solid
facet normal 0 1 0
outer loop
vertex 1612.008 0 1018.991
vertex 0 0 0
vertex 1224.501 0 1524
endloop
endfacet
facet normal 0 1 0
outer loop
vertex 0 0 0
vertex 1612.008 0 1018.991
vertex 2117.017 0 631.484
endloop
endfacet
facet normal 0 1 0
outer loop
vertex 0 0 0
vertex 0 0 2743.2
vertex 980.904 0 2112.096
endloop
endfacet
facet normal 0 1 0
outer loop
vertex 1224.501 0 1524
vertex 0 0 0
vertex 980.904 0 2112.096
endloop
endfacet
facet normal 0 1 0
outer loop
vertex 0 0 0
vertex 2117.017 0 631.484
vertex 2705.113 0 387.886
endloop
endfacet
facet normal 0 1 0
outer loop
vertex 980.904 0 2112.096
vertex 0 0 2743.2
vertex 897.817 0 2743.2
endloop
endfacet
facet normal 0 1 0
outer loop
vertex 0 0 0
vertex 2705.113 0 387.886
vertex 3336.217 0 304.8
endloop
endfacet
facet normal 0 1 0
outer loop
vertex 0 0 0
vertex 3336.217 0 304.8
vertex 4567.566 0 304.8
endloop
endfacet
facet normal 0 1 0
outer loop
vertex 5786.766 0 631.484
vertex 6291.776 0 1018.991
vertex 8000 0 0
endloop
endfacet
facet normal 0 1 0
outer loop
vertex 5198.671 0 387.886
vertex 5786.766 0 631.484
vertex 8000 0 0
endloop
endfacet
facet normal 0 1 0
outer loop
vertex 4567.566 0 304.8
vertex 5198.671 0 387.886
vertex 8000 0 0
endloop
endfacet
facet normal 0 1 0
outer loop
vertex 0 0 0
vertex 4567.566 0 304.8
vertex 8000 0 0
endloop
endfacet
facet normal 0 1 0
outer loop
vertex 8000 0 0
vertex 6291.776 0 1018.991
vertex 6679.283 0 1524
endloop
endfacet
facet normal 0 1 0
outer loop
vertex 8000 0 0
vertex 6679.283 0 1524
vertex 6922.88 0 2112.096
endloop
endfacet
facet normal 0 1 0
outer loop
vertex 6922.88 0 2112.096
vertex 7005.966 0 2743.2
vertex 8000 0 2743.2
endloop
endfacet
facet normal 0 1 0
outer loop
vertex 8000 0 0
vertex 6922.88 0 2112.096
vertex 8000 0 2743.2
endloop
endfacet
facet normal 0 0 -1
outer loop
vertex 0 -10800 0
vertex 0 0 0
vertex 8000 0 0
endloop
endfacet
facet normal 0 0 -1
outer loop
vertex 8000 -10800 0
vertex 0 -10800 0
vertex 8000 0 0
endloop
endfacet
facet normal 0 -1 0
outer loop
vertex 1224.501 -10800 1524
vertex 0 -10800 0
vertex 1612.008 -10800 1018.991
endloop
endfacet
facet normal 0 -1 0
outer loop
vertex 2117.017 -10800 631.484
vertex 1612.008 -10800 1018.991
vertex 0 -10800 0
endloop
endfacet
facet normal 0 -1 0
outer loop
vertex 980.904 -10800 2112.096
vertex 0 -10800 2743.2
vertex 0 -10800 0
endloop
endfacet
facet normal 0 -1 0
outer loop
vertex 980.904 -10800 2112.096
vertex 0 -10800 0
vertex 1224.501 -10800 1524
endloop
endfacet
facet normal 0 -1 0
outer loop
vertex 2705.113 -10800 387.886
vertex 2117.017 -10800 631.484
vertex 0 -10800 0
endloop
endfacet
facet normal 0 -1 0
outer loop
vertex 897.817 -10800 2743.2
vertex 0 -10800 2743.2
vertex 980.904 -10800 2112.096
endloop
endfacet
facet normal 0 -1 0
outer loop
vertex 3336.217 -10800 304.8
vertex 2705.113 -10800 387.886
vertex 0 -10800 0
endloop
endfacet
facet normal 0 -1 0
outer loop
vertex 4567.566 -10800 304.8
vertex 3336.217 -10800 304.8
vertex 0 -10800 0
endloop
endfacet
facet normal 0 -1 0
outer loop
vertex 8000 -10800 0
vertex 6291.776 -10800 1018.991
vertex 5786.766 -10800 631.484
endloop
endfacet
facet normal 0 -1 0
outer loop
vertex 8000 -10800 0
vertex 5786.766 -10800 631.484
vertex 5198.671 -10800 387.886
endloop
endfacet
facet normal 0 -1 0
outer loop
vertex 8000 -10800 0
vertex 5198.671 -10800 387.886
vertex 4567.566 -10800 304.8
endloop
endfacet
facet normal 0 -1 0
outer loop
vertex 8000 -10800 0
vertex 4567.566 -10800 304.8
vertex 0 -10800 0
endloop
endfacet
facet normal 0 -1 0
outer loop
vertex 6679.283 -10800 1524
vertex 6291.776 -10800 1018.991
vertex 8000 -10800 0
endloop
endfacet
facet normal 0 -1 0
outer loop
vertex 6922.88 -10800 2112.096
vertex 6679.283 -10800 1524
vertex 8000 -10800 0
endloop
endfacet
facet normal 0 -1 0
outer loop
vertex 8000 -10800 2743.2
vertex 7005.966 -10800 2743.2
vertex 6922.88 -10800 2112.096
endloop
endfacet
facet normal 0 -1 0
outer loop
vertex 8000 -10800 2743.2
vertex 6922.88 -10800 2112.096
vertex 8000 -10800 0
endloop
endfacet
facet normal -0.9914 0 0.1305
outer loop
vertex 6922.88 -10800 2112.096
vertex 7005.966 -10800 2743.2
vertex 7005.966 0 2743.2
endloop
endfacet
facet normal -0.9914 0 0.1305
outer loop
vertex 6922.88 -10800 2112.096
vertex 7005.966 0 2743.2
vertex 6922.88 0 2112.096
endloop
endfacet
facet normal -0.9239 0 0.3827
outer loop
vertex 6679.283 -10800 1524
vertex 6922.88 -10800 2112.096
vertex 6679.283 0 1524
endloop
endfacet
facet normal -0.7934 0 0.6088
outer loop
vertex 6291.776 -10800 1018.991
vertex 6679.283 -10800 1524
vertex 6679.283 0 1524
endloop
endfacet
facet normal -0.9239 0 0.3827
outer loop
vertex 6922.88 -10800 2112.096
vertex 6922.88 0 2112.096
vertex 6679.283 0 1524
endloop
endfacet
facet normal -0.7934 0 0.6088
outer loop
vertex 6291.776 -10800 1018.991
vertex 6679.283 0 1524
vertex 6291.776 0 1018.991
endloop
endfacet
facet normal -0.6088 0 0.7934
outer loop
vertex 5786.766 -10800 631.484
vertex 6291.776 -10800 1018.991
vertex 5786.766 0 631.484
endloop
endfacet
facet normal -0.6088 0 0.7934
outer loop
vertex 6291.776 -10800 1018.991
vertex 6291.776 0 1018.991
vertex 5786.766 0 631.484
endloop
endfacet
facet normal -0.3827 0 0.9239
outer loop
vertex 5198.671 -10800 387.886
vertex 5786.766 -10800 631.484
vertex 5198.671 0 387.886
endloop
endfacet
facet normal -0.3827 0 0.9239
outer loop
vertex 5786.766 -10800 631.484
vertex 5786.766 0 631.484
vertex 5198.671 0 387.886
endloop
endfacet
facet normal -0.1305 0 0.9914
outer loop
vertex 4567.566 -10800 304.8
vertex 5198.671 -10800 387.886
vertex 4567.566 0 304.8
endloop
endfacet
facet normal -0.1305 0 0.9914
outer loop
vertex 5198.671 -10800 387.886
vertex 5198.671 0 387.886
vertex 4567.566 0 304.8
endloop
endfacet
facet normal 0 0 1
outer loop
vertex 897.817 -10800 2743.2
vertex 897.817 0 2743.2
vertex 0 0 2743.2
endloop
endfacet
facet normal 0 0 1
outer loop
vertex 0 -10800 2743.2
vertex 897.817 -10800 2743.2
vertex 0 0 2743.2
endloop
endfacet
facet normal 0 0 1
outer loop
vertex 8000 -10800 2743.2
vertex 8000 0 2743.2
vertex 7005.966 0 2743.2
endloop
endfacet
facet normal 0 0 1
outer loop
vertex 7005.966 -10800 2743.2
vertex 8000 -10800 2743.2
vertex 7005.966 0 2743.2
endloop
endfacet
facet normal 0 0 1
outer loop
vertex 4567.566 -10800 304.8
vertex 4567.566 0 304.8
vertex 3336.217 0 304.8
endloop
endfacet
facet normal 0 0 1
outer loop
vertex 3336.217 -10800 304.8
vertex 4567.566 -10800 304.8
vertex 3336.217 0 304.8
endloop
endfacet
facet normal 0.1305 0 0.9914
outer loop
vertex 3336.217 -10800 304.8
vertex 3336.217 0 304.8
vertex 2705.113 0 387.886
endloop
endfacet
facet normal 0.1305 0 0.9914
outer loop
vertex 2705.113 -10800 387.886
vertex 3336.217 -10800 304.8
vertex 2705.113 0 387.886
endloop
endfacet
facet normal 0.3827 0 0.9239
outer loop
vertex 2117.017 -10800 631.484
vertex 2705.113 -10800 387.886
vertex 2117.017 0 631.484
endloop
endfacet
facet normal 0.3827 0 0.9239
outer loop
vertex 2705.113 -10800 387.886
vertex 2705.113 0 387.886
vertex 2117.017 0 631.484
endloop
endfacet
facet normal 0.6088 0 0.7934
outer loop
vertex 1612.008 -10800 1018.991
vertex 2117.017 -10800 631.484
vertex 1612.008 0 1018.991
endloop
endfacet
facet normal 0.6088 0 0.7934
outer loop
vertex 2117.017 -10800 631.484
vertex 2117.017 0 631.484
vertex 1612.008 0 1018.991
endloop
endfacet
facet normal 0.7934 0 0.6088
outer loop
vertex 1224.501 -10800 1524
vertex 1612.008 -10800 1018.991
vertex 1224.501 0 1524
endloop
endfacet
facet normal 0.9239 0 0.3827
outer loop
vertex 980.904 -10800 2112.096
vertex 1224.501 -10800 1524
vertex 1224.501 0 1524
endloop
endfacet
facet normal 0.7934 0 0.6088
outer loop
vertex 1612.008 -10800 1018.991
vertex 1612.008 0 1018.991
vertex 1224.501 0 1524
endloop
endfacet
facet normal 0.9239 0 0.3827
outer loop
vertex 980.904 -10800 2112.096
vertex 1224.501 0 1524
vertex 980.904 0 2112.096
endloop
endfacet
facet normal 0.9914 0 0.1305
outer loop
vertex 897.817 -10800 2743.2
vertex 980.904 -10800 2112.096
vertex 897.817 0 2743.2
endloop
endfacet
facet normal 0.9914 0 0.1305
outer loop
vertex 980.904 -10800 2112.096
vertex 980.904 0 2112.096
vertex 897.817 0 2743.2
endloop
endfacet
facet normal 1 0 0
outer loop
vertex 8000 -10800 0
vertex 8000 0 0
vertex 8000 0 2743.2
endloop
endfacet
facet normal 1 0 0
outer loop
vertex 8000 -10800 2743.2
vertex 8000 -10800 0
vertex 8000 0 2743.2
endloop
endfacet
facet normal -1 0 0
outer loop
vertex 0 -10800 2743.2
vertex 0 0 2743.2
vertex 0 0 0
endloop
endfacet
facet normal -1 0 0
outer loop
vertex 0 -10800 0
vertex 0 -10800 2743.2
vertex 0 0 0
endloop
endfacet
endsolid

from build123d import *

# Parameters (mm, degrees)
F1_DEPTH = 10800


with BuildPart() as f1:
    # F0 (on Front) → F1 (new body)
    with BuildSketch(Plane.XZ):
        with BuildLine():
            Line((0, 2743.2), (0, 304.8))
            Line((0, 304.8), (3336.217165, 304.8))
            ThreePointArc((3336.217165, 304.8), (1612.00799, 1018.990825), (897.817165, 2743.2))
            Line((897.817165, 2743.2), (0, 2743.2))
        make_face()
        Polygon((0, 304.8), (0, 0), (8000, 0), (8000, 304.8), (4567.566395, 304.8), (3336.217165, 304.8), align=None)
        with BuildLine():
            Line((4567.566395, 304.8), (8000, 304.8))
            Line((8000, 304.8), (8000, 2743.2))
            Line((8000, 2743.2), (7005.966395, 2743.2))
            ThreePointArc((7005.966395, 2743.2), (6291.77557, 1018.990825), (4567.566395, 304.8))
        make_face()
    extrude(amount=F1_DEPTH)


solid = f1.part
